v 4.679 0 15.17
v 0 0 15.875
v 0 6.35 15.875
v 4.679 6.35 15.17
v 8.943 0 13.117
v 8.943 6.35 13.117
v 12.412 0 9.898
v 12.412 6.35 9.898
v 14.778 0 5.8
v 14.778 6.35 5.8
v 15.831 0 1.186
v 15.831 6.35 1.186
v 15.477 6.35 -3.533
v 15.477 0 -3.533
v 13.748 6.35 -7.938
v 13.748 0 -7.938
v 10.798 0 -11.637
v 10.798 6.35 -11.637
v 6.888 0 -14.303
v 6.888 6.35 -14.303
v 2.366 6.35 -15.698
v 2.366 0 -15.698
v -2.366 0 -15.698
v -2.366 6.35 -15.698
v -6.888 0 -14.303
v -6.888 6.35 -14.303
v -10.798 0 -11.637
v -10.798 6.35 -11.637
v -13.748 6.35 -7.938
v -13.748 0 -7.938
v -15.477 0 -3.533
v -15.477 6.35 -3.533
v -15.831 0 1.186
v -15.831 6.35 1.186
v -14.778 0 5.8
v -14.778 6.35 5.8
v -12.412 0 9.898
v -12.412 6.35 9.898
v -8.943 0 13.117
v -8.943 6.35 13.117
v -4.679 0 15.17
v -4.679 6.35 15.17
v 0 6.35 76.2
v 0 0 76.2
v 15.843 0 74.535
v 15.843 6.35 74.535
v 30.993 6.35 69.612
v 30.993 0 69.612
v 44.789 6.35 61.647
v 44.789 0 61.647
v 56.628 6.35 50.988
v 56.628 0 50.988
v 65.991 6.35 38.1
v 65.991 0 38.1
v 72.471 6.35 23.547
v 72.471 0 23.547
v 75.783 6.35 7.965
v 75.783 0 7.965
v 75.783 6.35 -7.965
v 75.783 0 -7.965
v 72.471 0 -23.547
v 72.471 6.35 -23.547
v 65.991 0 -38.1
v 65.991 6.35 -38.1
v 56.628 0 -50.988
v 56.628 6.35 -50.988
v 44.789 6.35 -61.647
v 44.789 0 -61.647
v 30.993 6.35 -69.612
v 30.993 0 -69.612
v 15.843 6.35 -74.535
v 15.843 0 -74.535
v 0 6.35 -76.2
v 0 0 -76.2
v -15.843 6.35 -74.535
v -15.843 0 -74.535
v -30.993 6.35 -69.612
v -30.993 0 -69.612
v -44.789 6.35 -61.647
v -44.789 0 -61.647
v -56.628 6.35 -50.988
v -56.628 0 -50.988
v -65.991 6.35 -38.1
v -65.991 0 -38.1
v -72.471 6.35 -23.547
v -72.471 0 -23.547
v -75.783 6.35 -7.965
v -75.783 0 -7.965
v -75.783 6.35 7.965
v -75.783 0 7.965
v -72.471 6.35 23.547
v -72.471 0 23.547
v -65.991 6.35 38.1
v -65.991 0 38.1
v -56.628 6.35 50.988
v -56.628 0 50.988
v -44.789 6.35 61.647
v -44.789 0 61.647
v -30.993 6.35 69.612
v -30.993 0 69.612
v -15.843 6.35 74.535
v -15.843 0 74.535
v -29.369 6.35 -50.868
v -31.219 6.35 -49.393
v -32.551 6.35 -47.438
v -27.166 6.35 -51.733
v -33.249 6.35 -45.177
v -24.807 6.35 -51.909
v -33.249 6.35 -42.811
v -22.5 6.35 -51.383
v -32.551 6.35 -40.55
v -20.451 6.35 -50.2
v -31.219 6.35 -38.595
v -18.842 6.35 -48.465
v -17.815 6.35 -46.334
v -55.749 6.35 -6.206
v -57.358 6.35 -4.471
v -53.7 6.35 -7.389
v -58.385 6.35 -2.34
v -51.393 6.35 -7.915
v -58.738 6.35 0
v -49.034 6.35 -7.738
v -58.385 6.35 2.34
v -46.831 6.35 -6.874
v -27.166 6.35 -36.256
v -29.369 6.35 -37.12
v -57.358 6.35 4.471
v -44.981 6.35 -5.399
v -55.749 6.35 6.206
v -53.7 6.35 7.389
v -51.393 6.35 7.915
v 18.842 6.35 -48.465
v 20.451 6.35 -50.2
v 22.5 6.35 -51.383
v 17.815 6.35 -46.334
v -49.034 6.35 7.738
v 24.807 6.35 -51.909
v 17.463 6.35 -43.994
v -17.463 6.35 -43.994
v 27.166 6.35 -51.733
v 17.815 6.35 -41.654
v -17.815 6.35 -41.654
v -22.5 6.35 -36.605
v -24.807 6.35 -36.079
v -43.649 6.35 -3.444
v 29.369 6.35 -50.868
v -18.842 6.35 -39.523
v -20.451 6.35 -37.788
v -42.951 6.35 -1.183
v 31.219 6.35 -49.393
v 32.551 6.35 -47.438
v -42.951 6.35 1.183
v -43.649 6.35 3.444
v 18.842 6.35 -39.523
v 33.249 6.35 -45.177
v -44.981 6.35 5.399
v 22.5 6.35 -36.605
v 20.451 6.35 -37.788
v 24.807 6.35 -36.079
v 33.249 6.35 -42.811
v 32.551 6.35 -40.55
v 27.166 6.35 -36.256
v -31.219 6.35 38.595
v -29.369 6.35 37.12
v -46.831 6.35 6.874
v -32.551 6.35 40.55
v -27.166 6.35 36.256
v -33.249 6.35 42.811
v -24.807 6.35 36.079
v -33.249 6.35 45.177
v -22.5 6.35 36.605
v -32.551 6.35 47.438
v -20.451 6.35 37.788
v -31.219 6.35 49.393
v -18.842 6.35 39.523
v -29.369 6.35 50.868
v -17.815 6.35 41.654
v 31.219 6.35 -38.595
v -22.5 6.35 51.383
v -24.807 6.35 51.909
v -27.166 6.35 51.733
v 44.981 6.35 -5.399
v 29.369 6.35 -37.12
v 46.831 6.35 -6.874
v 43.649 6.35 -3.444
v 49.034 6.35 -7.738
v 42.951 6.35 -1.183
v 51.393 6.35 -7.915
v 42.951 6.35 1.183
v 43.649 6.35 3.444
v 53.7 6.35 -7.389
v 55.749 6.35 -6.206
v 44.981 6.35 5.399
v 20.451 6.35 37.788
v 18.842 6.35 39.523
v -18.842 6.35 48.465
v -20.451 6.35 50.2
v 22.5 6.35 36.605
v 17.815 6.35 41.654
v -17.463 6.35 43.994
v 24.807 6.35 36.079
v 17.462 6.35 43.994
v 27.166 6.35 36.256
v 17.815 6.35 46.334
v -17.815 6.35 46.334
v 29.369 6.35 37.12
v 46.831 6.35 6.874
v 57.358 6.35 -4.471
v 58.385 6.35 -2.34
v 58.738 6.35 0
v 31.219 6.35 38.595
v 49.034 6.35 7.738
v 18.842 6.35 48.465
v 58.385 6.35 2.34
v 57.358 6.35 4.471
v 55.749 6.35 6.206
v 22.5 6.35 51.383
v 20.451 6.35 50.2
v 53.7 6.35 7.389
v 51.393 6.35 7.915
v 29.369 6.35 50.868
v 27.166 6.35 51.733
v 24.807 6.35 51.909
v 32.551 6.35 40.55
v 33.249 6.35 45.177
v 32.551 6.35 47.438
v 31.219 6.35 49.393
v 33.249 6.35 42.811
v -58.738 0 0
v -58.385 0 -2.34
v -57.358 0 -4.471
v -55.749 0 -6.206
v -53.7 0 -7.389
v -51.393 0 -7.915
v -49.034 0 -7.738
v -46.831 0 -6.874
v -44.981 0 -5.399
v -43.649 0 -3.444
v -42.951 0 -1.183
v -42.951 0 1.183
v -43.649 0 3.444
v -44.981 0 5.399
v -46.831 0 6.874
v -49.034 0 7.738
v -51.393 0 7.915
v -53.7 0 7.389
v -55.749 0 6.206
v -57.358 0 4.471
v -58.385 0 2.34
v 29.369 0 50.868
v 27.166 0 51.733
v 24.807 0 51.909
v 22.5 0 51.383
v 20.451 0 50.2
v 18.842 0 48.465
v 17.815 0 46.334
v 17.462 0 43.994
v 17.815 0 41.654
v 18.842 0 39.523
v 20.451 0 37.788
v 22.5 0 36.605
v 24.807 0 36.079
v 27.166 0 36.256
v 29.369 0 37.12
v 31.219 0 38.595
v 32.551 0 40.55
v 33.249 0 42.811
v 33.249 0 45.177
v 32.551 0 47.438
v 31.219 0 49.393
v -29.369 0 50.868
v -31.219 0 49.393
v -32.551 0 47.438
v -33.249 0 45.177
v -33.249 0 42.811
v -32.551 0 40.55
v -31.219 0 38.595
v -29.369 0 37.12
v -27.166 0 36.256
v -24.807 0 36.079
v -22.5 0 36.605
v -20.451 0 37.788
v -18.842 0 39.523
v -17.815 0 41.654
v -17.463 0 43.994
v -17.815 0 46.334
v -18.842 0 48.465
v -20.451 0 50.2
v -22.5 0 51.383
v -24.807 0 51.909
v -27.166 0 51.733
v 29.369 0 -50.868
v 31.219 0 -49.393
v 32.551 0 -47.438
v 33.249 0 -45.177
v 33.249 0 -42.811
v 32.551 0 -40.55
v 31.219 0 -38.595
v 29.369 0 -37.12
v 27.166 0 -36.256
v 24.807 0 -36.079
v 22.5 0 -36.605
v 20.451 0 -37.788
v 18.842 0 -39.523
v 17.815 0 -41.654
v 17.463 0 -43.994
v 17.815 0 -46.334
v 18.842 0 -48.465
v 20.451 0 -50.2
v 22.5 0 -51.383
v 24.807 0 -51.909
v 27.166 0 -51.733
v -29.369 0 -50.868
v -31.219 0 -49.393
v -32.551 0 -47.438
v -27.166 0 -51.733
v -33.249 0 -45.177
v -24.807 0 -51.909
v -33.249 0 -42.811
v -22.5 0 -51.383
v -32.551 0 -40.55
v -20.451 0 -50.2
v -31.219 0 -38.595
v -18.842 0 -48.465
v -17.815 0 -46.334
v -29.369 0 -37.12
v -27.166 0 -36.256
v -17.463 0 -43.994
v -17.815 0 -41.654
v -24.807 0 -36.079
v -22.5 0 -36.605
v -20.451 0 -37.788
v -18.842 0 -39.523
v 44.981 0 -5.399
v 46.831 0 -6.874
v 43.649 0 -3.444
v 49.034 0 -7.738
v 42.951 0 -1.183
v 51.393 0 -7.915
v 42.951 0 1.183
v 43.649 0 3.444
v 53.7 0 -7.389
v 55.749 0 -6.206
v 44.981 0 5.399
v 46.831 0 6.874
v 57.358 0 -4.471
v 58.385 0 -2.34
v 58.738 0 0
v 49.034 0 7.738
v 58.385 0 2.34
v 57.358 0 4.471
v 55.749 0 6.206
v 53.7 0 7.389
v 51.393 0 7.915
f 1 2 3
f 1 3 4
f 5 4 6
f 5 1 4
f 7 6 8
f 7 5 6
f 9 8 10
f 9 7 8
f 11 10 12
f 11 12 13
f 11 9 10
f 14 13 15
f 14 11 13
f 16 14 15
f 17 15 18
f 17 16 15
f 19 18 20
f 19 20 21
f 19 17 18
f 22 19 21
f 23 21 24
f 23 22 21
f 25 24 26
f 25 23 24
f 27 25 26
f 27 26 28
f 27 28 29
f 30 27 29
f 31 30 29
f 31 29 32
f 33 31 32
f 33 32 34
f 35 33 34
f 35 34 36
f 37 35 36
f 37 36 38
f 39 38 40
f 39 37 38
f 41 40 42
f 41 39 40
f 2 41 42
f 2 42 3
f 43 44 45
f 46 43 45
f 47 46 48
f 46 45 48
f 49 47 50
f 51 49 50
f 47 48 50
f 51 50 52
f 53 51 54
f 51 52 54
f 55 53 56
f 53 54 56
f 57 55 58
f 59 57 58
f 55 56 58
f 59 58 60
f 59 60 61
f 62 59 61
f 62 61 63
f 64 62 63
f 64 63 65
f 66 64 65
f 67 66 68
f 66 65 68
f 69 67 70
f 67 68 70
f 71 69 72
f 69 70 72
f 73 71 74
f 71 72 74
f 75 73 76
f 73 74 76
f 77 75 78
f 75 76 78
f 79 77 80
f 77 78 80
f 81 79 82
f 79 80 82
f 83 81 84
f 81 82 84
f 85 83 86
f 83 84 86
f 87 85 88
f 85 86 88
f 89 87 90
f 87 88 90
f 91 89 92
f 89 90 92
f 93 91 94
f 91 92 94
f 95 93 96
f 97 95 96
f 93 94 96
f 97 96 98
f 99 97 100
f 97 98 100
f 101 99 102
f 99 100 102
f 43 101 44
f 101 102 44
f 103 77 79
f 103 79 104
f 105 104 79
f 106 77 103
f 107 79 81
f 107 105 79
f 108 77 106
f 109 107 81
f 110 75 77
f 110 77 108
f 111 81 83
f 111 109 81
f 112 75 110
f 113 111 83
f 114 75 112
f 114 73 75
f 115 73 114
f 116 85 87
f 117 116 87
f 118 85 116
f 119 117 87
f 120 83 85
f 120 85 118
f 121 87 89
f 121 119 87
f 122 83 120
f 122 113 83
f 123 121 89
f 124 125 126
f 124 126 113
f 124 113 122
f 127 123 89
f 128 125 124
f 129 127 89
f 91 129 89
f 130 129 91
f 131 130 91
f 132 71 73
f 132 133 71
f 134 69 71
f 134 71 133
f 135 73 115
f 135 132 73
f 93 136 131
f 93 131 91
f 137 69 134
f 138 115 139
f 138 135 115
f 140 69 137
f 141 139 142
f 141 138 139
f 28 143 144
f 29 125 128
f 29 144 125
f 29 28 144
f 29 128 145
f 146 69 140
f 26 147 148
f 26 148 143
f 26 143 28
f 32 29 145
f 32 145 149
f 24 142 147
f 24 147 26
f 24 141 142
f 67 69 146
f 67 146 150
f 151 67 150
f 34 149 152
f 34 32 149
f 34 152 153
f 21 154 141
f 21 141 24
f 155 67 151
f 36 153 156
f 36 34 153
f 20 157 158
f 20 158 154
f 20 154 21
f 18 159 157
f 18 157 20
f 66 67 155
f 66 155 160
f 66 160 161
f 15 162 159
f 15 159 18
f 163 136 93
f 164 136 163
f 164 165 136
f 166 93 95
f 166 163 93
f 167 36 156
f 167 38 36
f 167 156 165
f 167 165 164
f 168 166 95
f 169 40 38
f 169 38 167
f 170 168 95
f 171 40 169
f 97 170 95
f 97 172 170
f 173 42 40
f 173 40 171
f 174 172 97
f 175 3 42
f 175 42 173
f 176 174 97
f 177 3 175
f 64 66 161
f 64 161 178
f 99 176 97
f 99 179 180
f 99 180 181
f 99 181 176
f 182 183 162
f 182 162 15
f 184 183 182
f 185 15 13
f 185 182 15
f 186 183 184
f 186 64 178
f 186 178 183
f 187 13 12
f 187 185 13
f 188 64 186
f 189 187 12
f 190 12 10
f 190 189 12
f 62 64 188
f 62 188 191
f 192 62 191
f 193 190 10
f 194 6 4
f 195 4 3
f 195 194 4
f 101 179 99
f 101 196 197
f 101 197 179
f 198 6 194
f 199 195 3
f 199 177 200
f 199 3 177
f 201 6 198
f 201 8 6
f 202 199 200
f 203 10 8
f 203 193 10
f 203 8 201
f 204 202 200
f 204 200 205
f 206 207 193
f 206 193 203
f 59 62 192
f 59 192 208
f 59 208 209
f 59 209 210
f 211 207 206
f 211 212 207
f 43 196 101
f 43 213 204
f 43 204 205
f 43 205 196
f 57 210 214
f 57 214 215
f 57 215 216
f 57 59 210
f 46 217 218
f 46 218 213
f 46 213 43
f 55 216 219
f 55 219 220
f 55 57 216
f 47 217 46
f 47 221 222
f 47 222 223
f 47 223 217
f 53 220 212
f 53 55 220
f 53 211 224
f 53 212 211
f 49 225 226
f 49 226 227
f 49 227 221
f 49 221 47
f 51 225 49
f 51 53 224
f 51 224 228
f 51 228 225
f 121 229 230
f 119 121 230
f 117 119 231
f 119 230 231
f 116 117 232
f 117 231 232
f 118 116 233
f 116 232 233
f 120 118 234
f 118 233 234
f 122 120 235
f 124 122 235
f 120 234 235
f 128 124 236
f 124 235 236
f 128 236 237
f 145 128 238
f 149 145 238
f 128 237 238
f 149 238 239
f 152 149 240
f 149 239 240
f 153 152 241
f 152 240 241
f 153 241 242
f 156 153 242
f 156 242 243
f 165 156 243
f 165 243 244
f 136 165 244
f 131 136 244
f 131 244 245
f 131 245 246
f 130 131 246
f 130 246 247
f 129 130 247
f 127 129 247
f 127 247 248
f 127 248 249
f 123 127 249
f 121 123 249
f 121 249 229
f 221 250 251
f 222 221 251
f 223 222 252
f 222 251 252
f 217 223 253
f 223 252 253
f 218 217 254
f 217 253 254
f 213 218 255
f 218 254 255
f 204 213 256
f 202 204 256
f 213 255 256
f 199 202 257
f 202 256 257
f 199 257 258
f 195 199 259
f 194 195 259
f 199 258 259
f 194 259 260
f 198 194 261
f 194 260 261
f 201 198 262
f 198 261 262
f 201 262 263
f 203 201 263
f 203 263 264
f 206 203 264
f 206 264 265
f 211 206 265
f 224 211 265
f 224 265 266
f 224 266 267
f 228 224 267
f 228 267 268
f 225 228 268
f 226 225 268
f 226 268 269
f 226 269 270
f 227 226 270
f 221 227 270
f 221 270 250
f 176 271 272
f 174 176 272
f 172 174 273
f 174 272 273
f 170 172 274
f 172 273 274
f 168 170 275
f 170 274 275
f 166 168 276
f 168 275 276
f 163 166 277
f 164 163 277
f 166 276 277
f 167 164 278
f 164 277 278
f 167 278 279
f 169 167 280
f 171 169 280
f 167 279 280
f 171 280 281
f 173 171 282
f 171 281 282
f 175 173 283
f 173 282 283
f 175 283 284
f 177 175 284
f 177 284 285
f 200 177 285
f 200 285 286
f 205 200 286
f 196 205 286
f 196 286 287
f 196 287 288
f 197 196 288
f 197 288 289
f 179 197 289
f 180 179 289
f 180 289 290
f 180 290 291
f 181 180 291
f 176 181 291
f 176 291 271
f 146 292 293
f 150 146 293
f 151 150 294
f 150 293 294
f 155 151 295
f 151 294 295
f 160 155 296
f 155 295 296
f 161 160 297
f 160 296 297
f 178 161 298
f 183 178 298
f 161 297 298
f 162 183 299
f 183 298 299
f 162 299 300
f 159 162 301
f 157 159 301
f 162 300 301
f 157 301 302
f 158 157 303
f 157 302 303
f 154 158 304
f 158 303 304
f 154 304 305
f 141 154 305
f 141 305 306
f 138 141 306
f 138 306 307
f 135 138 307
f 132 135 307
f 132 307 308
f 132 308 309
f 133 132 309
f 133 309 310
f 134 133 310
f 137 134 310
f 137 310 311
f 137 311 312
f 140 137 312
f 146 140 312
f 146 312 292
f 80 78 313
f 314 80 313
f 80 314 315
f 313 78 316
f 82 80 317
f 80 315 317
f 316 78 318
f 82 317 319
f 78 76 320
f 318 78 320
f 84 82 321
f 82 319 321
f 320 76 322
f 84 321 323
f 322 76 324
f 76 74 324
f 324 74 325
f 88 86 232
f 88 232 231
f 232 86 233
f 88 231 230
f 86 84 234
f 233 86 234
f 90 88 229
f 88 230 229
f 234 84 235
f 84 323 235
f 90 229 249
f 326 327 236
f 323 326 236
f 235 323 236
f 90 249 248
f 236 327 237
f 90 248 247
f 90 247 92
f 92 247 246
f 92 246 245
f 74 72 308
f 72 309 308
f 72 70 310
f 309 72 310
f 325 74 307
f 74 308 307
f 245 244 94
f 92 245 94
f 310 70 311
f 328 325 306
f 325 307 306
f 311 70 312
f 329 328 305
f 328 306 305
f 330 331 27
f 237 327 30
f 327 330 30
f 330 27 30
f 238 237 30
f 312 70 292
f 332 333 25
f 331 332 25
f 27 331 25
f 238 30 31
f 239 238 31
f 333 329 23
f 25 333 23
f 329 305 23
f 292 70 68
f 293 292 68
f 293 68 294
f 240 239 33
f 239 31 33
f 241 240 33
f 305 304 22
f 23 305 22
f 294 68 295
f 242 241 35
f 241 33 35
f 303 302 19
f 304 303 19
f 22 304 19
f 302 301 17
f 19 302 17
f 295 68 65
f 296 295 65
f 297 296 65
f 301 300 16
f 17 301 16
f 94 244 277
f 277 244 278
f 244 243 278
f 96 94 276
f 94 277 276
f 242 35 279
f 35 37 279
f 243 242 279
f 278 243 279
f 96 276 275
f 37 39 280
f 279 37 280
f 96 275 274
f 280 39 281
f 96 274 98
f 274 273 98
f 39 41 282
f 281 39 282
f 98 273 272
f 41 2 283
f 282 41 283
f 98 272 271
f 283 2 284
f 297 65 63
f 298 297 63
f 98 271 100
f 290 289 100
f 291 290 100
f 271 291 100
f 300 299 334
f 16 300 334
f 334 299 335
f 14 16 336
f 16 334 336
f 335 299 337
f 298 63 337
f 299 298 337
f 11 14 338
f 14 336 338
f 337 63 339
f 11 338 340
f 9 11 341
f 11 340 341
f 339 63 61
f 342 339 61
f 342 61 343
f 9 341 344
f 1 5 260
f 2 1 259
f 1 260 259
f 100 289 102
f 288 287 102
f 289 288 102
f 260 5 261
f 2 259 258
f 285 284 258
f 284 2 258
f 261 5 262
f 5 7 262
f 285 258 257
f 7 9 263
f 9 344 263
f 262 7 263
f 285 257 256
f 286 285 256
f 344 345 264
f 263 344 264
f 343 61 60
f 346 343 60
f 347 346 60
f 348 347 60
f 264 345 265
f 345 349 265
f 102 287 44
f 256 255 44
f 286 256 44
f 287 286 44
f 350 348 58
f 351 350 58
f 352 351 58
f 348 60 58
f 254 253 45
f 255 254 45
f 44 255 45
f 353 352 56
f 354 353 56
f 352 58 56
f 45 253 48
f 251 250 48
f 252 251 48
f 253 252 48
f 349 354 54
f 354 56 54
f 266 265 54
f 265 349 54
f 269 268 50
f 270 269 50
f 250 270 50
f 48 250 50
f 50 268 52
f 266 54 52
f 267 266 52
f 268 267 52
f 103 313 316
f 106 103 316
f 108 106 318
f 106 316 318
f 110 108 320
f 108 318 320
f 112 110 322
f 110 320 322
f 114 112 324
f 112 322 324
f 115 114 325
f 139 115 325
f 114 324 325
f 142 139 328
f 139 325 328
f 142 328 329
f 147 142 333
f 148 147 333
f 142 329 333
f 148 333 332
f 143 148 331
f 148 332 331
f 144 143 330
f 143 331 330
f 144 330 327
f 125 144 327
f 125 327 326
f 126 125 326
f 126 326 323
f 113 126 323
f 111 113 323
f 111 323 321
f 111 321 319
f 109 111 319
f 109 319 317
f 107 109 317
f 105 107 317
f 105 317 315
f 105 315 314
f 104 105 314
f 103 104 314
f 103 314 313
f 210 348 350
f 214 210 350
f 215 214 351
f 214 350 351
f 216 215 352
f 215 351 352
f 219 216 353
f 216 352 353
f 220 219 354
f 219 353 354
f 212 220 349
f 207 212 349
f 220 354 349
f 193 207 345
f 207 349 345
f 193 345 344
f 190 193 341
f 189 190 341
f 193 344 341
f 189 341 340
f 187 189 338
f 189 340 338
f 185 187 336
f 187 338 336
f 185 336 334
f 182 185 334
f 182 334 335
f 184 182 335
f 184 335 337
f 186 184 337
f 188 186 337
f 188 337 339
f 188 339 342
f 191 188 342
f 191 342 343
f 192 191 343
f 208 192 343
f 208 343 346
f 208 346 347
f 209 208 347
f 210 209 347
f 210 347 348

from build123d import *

# Parameters (mm, degrees)
SKETCH1_R                    = 76.2
SKETCH1_R_2                  = 15.875
PLATE_EXTRUDE_DEPTH          = 6.35
F_5_8_0_625_DIAMETER_HOLE1_D = 15.875
CIRPATTERN1_COUNT            = 6


with BuildPart() as part:
    # Sketch1 → Plate extrude (new body)
    with BuildSketch(Plane(origin=(0, 0, 0), x_dir=(1, 0, 0), z_dir=(0, 1, 0))):
        with Locations(Location((0, 0, 0), (0, 0, 270))):
            Circle(SKETCH1_R)
        with Locations(Location((0, 0, 0), (0, 0, 270))):
            Circle(SKETCH1_R_2, mode=Mode.SUBTRACT)
    extrude(amount=PLATE_EXTRUDE_DEPTH)

    # 5/8 (0.625) Diameter Hole1 (through all)
    with Locations(Plane(origin=(0, 6.35, 0), x_dir=(1, 0, 0), z_dir=(0, 1, 0))):
        with Locations((-50.8, 0)):
            f_5_8_0_625_diameter_hole1 = Hole(F_5_8_0_625_DIAMETER_HOLE1_D / 2)

    # CirPattern1: 5/8 (0.625) Diameter Hole1 ×6 about axis
    cirpattern1_axis = Axis((0, 0, 0), (0, 1, 0))
    for i in range(1, CIRPATTERN1_COUNT):
        add(f_5_8_0_625_diameter_hole1.rotate(cirpattern1_axis, i * 360 / CIRPATTERN1_COUNT), mode=Mode.SUBTRACT)


solid = part.part
